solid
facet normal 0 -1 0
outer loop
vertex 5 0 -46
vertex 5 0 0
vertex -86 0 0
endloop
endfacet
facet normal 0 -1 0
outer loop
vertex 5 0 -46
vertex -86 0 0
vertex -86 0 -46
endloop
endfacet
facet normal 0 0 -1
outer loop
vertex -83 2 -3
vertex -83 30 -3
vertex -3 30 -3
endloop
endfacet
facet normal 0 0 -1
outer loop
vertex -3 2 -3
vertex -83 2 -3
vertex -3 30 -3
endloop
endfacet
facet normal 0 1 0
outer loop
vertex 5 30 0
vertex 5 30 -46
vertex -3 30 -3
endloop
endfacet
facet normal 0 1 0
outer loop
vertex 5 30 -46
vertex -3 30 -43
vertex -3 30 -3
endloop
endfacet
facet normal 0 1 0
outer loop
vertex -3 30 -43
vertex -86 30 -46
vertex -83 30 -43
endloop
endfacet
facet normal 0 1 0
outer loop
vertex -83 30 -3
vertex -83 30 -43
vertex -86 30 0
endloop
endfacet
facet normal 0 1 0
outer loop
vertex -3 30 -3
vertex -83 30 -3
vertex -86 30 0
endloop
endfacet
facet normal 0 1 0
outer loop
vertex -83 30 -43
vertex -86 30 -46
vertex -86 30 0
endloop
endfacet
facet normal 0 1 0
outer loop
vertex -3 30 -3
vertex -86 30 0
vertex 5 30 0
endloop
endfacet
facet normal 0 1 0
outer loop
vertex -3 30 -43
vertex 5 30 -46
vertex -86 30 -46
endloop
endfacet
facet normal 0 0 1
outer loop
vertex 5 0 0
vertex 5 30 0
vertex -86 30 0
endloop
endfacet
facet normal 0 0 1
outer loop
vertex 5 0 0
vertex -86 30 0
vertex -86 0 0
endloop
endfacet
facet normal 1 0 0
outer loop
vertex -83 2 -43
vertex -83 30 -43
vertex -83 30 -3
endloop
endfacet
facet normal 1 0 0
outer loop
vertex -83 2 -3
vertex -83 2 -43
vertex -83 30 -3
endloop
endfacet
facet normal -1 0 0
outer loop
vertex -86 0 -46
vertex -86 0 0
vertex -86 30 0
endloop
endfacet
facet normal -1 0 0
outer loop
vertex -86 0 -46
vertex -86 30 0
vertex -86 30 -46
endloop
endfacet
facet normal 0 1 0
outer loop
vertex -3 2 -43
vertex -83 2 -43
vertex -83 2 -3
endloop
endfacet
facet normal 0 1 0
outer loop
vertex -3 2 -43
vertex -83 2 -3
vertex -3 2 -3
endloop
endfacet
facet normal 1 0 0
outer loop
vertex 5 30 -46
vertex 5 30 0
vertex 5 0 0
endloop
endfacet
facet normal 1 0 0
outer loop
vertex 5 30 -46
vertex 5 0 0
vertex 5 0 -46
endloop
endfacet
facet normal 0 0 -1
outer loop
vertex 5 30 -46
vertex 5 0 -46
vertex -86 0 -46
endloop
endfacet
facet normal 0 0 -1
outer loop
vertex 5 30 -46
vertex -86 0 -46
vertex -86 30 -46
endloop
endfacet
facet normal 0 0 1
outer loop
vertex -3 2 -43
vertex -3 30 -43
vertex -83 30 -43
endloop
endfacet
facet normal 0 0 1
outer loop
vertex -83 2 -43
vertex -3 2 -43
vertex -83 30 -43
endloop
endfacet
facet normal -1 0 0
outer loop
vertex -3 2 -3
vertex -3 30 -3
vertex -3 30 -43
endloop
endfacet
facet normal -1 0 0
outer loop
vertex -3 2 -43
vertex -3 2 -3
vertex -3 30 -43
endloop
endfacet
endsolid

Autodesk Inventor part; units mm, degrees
ref_plane "YZ Plane" through (0, 0, 0) normal (1, 0, 0) x (0, 1, 0)
ref_plane "XZ Plane" through (0, 0, 0) normal (0, 1, 0) x (-1, 0, 0)
ref_plane "XY Plane" through (0, 0, 0) normal (0, 0, 1) x (1, 0, 0)
sketch "スケッチ1" plane through (0, 0, 0) normal (0, 1, 0) x (-1, 0, 0)
  line L0 (0, 0) -> (86, 0)
  line L1 (86, 0) -> (86, -46)
  line L2 (86, -46) -> (0, -46)
  line L3 (0, -46) -> (0, 0)
  dimension "d0" = 86
  dimension "d1" = 46
extrude "押し出し1" add sketch "スケッチ1" along normal blind 30
sketch "スケッチ2" plane through (0, 30, 0) normal (0, 1, 0) x (1, 0, 0)
  line L0 (-83, 3) -> (-3, 3)
  line L1 (-3, 3) -> (-3, 43)
  line L2 (-3, 43) -> (-83, 43)
  line L3 (-83, 43) -> (-83, 3)
  line L4 (-86, 46) -> (-86, 0) projected
  line L5 (-86, 0) -> (0, 0) projected
  point P0 (-83, 23)
  point P1 (-86, 23)
  point P2 (-43, 3)
  point P3 (-43, 0)
  dimension "d4" = 80
  dimension "d5" = 40
extrude "押し出し2" cut sketch "スケッチ2" against normal blind 28
sketch "スケッチ3" plane through (0, 0, 0) normal (1, 0, 0) x (0, 0, -1)
  line L0 (46, 30) -> (0, 30)
  line L1 (0, 30) -> (0, 0)
  line L2 (0, 0) -> (46, 0)
  line L3 (46, 0) -> (46, 30)
extrude "押し出し3" add sketch "スケッチ3" along normal blind 5
sketch "スケッチ4" plane through (5, 0, 0) normal (1, 0, 0) x (0, 0, -1)
  point P0 (0, 0)
